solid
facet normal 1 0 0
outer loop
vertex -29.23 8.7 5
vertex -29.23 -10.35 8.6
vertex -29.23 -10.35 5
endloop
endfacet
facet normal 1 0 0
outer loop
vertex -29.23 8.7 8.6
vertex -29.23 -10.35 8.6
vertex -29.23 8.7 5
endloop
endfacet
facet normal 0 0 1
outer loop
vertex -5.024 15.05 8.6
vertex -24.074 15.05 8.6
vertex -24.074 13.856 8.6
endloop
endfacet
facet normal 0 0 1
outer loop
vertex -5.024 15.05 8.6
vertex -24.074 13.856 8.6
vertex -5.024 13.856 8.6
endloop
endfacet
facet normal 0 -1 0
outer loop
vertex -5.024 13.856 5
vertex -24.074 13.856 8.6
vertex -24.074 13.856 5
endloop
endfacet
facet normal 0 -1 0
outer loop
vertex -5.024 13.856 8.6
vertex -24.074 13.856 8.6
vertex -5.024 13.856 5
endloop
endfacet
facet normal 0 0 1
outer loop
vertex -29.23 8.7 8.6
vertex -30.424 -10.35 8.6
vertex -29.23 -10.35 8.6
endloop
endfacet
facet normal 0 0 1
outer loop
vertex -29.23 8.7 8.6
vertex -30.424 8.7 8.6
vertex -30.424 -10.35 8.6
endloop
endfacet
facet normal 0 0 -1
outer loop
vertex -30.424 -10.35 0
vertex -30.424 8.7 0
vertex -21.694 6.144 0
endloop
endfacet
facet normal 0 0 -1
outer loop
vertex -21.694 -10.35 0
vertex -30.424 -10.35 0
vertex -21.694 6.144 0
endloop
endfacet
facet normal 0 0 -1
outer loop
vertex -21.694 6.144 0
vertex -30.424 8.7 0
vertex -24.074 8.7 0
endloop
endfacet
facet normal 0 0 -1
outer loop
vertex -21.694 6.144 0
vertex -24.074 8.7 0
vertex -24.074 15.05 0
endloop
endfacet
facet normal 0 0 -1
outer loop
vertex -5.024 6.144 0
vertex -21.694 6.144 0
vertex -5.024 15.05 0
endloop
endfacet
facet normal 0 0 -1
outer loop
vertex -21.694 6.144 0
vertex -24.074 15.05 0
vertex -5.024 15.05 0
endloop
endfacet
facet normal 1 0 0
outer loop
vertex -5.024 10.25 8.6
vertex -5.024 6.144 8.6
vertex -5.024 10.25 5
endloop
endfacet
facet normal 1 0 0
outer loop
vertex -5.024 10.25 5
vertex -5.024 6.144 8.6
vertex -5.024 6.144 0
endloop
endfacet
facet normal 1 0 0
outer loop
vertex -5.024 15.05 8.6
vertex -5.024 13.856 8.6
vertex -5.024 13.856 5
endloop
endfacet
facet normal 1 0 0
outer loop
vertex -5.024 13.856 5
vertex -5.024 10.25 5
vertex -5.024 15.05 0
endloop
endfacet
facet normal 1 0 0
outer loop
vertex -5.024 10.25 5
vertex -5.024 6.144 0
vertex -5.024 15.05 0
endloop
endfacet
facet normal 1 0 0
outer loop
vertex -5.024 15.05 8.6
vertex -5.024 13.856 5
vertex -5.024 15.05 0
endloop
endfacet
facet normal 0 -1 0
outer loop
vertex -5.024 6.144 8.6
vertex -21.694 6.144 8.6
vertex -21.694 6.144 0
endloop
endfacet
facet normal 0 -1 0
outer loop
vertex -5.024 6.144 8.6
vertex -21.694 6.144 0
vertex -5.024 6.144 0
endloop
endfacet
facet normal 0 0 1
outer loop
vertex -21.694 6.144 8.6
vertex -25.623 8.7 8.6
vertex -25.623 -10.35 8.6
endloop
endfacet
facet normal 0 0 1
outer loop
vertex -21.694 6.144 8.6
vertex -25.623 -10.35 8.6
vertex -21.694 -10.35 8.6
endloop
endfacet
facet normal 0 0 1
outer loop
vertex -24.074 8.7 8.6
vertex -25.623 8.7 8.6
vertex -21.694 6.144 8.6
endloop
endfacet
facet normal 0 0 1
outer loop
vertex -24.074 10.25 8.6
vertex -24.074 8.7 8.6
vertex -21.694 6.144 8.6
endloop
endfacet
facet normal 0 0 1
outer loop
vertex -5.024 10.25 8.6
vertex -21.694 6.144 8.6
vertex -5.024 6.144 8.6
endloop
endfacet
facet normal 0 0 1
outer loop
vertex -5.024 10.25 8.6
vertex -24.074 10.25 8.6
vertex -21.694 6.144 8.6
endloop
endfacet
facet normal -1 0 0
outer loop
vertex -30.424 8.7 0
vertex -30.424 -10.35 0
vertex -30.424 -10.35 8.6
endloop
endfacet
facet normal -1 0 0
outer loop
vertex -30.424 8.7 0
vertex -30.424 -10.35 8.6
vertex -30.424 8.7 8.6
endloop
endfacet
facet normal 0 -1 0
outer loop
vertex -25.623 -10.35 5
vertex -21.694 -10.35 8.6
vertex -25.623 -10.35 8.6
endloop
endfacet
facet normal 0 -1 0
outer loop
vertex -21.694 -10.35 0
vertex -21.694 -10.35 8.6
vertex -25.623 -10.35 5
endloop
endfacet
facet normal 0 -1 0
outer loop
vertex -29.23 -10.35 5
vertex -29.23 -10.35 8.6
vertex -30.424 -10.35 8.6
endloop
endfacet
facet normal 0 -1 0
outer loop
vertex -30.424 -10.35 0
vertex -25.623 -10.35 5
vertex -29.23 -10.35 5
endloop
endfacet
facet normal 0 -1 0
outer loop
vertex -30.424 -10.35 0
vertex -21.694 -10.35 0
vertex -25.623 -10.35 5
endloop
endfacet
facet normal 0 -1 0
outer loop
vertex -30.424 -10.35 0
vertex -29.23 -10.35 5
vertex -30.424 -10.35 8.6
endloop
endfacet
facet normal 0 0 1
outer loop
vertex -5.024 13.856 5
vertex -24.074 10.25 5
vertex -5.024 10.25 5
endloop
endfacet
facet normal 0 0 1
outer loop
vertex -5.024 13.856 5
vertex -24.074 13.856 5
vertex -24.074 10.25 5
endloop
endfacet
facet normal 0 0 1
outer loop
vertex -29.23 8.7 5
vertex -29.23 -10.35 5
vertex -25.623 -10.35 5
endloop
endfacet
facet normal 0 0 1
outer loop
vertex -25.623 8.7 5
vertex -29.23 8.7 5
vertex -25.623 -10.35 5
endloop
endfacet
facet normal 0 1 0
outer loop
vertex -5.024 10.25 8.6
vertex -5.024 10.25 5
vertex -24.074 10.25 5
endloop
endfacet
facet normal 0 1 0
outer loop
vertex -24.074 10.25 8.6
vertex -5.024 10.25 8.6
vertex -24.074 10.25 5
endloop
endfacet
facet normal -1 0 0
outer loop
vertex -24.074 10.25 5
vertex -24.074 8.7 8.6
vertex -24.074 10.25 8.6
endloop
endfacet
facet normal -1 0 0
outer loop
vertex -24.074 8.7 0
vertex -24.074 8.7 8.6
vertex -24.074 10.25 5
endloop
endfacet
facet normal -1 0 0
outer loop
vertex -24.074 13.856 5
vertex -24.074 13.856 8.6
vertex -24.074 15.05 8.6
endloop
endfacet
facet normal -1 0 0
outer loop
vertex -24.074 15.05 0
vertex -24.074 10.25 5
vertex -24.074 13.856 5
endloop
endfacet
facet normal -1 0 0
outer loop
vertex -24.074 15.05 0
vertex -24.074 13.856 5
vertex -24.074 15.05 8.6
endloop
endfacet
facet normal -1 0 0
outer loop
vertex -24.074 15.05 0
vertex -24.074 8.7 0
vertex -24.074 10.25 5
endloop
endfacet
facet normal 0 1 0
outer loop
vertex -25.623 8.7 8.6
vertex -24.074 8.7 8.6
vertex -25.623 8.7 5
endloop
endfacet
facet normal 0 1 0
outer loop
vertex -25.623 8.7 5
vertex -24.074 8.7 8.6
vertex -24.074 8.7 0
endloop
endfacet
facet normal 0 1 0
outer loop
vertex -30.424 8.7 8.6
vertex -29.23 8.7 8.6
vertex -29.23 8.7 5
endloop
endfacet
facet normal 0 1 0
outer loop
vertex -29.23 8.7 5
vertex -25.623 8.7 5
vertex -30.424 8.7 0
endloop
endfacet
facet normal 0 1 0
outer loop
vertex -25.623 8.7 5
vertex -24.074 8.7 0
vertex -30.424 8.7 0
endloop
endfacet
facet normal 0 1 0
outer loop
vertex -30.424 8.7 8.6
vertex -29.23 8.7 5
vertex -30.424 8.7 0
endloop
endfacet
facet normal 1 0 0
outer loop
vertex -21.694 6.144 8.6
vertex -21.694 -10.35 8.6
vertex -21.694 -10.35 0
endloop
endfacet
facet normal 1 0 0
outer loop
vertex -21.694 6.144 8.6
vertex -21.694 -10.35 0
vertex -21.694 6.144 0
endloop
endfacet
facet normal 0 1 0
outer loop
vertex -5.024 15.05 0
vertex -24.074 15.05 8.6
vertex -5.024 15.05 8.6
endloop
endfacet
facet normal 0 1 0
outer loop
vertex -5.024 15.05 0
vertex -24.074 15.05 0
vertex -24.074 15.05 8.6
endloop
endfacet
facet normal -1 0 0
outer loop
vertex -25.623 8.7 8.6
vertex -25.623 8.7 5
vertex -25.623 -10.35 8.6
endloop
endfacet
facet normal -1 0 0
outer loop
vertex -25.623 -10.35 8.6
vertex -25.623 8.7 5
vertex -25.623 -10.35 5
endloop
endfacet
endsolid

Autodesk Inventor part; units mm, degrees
ref_plane "YZ Plane" through (0, 0, 0) normal (1, 0, 0) x (0, 1, 0)
ref_plane "XZ Plane" through (0, 0, 0) normal (0, 1, 0) x (-1, 0, 0)
ref_plane "XY Plane" through (0, 0, 0) normal (0, 0, 1) x (1, 0, 0)
sketch "Sketch1" plane through (0, 0, 0) normal (0, 0, 1) x (1, 0, 0)
  line L0 (-30.4239, 15.0503) -> (-5.0239, 15.0503)
  line L1 (-5.0239, 15.0503) -> (-5.0239, -10.3497)
  line L2 (-5.0239, -10.3497) -> (-30.4239, -10.3497)
  line L3 (-30.4239, -10.3497) -> (-30.4239, 15.0503)
  point P0 (0, 0)
  dimension "d0" = 25.4
  dimension "d1" = 25.4
extrude "Extrusion1" add sketch "Sketch1" along normal blind 6.6
sketch "Sketch2" plane through (0, 0, 6.6) normal (0, 0, 1) x (1, 0, 0)
  line L0 (-5.0239, 15.0503) -> (-30.4239, 15.0503) projected
  line L1 (-30.4239, 15.0503) -> (-24.0739, 15.0503)
  line L2 (-24.0739, 15.0503) -> (-24.0739, 8.7003)
  line L3 (-24.0739, 8.7003) -> (-30.4239, 8.7003)
  line L4 (-30.4239, 8.7003) -> (-30.4239, 15.0503)
  point P0 (0, 0)
  dimension "d4" = 6.35
  dimension "d5" = 6.35
extrude "Extrusion2" cut sketch "Sketch2" against normal blind 6.6
sketch "Sketch3" plane through (0, 0, 6.6) normal (0, 0, 1) x (1, 0, 0)
  line L0 (-5.0239, 15.0503) -> (-24.0739, 15.0503) projected
  line L1 (-24.0739, 8.7003) -> (-24.0739, 15.0503) construction
  line L2 (-24.0739, 15.0503) -> (-24.0739, 8.7003) construction
  line L3 (-30.4239, 8.7003) -> (-24.0739, 8.7003) construction
  line L4 (-24.0739, 8.7003) -> (-30.4239, 8.7003) construction
  line L5 (-27.2489, 8.7003) -> (-27.2489, -10.3839) construction
  line L6 (-24.0739, 11.8753) -> (-5.0239, 11.8753) construction
  line L7 (-5.0239, -10.3497) -> (-5.0239, 15.0503) projected
  line L8 (-5.0239, 13.5009) -> (-5.0239, 10.2497)
  line L9 (-5.0239, 10.2497) -> (-24.0739, 10.2497)
  line L10 (-24.0739, 10.2497) -> (-24.0739, 13.5009)
  line L11 (-30.4239, -10.3497) -> (-5.0239, -10.3497) projected
  line L12 (-28.8745, 8.7003) -> (-25.6233, 8.7003)
  line L13 (-25.6233, 8.7003) -> (-25.6233, -10.3497)
  line L14 (-25.6233, -10.3497) -> (-28.8745, -10.3497)
  line L15 (-28.8745, -10.3497) -> (-29.2301, -10.3497)
  line L16 (-29.2301, -10.3497) -> (-29.2301, 8.7003)
  line L17 (-28.8745, 8.7003) -> (-29.2301, 8.7003)
  line L18 (-24.0739, 13.5009) -> (-24.0739, 13.8565)
  line L19 (-24.0739, 13.8565) -> (-5.0239, 13.8565)
  line L20 (-5.0239, 13.8565) -> (-5.0239, 13.5009)
  point P0 (0, 0)
  dimension "d8" = 3.2512
  dimension "d20" = 0.3556
  dimension "d21" = 0.3556
extrude "Extrusion3" cut sketch "Sketch3" against normal blind 1.6
sketch "Sketch4" plane through (0, 0, 6.6) normal (0, 0, 1) x (1, 0, 0)
  line L0 (-24.0739, 8.7003) -> (-25.6233, 8.7003) projected
  line L1 (-25.6233, 8.7003) -> (-24.0739, 8.7003)
  line L2 (-5.0239, 10.2497) -> (-24.0739, 10.2497) projected
  line L3 (-24.0739, 8.7003) -> (-24.0739, 10.2497)
  line L4 (-24.0739, 10.2497) -> (-5.0239, 10.2497)
  line L5 (-5.0239, -10.3497) -> (-5.0239, 10.2497) projected
  line L6 (-5.0239, 10.2497) -> (-5.0239, -10.3497)
  line L7 (-5.0239, -10.3497) -> (-25.6233, -10.3497)
  line L8 (-5.0239, -10.3497) -> (-30.4239, -10.3497) projected
  line L9 (-25.6233, 8.7003) -> (-25.6233, -10.3497)
  point P0 (0, 0)
extrude "Extrusion4" add sketch "Sketch4" along normal blind 2
sketch "Sketch5" plane through (0, 0, 6.6) normal (0, 0, 1) x (1, 0, 0)
  line L0 (-5.0239, 15.0503) -> (-24.0739, 15.0503) projected
  line L1 (-24.0739, 15.0503) -> (-5.0239, 15.0503)
  line L2 (-30.4239, -10.3497) -> (-30.4239, 8.7003)
  line L3 (-30.4239, 8.7003) -> (-29.2301, 8.7003)
  line L4 (-30.4239, 8.7003) -> (-24.0739, 8.7003) projected
  line L5 (-29.2301, 8.7003) -> (-29.2301, -10.3497)
  line L6 (-30.4239, -10.3497) -> (-29.2301, -10.3497) projected
  line L7 (-29.2301, -10.3497) -> (-30.4239, -10.3497)
  line L8 (-24.0739, 15.0503) -> (-24.0739, 13.8565) projected
  line L9 (-24.0739, 15.0503) -> (-24.0739, 13.8565)
  line L10 (-24.0739, 13.8565) -> (-5.0239, 13.8565)
  line L11 (-5.0239, 13.8565) -> (-5.0239, 15.0503) projected
  point P0 (0, 0)
  point P1 (-5.0239, 13.5009)
  point P2 (-28.8745, -10.3497)
  point P3 (-24.0739, 13.5009)
  dimension "d18" = 1.1938
  dimension "d19" = 1.1938
extrude "Extrusion5" add sketch "Sketch5" along normal blind 2
sketch "Sketch6" plane through (0, 0, 8.6) normal (0, 0, 1) x (1, 0, 0)
  line L0 (-25.6233, -10.3497) -> (-5.0239, -10.3497) projected
  line L1 (-5.0239, -10.3497) -> (-21.6937, -10.3497)
  line L2 (-21.6937, -10.3497) -> (-21.6937, 6.1438)
  line L3 (-21.6937, 6.1438) -> (-5.0239, 6.1438)
  line L4 (-5.0239, 6.1438) -> (-5.0239, -10.3497)
  point P0 (0, 0)
extrude "Extrusion6" cut sketch "Sketch6" against normal blind 9
properties part number "BalsaJig"
